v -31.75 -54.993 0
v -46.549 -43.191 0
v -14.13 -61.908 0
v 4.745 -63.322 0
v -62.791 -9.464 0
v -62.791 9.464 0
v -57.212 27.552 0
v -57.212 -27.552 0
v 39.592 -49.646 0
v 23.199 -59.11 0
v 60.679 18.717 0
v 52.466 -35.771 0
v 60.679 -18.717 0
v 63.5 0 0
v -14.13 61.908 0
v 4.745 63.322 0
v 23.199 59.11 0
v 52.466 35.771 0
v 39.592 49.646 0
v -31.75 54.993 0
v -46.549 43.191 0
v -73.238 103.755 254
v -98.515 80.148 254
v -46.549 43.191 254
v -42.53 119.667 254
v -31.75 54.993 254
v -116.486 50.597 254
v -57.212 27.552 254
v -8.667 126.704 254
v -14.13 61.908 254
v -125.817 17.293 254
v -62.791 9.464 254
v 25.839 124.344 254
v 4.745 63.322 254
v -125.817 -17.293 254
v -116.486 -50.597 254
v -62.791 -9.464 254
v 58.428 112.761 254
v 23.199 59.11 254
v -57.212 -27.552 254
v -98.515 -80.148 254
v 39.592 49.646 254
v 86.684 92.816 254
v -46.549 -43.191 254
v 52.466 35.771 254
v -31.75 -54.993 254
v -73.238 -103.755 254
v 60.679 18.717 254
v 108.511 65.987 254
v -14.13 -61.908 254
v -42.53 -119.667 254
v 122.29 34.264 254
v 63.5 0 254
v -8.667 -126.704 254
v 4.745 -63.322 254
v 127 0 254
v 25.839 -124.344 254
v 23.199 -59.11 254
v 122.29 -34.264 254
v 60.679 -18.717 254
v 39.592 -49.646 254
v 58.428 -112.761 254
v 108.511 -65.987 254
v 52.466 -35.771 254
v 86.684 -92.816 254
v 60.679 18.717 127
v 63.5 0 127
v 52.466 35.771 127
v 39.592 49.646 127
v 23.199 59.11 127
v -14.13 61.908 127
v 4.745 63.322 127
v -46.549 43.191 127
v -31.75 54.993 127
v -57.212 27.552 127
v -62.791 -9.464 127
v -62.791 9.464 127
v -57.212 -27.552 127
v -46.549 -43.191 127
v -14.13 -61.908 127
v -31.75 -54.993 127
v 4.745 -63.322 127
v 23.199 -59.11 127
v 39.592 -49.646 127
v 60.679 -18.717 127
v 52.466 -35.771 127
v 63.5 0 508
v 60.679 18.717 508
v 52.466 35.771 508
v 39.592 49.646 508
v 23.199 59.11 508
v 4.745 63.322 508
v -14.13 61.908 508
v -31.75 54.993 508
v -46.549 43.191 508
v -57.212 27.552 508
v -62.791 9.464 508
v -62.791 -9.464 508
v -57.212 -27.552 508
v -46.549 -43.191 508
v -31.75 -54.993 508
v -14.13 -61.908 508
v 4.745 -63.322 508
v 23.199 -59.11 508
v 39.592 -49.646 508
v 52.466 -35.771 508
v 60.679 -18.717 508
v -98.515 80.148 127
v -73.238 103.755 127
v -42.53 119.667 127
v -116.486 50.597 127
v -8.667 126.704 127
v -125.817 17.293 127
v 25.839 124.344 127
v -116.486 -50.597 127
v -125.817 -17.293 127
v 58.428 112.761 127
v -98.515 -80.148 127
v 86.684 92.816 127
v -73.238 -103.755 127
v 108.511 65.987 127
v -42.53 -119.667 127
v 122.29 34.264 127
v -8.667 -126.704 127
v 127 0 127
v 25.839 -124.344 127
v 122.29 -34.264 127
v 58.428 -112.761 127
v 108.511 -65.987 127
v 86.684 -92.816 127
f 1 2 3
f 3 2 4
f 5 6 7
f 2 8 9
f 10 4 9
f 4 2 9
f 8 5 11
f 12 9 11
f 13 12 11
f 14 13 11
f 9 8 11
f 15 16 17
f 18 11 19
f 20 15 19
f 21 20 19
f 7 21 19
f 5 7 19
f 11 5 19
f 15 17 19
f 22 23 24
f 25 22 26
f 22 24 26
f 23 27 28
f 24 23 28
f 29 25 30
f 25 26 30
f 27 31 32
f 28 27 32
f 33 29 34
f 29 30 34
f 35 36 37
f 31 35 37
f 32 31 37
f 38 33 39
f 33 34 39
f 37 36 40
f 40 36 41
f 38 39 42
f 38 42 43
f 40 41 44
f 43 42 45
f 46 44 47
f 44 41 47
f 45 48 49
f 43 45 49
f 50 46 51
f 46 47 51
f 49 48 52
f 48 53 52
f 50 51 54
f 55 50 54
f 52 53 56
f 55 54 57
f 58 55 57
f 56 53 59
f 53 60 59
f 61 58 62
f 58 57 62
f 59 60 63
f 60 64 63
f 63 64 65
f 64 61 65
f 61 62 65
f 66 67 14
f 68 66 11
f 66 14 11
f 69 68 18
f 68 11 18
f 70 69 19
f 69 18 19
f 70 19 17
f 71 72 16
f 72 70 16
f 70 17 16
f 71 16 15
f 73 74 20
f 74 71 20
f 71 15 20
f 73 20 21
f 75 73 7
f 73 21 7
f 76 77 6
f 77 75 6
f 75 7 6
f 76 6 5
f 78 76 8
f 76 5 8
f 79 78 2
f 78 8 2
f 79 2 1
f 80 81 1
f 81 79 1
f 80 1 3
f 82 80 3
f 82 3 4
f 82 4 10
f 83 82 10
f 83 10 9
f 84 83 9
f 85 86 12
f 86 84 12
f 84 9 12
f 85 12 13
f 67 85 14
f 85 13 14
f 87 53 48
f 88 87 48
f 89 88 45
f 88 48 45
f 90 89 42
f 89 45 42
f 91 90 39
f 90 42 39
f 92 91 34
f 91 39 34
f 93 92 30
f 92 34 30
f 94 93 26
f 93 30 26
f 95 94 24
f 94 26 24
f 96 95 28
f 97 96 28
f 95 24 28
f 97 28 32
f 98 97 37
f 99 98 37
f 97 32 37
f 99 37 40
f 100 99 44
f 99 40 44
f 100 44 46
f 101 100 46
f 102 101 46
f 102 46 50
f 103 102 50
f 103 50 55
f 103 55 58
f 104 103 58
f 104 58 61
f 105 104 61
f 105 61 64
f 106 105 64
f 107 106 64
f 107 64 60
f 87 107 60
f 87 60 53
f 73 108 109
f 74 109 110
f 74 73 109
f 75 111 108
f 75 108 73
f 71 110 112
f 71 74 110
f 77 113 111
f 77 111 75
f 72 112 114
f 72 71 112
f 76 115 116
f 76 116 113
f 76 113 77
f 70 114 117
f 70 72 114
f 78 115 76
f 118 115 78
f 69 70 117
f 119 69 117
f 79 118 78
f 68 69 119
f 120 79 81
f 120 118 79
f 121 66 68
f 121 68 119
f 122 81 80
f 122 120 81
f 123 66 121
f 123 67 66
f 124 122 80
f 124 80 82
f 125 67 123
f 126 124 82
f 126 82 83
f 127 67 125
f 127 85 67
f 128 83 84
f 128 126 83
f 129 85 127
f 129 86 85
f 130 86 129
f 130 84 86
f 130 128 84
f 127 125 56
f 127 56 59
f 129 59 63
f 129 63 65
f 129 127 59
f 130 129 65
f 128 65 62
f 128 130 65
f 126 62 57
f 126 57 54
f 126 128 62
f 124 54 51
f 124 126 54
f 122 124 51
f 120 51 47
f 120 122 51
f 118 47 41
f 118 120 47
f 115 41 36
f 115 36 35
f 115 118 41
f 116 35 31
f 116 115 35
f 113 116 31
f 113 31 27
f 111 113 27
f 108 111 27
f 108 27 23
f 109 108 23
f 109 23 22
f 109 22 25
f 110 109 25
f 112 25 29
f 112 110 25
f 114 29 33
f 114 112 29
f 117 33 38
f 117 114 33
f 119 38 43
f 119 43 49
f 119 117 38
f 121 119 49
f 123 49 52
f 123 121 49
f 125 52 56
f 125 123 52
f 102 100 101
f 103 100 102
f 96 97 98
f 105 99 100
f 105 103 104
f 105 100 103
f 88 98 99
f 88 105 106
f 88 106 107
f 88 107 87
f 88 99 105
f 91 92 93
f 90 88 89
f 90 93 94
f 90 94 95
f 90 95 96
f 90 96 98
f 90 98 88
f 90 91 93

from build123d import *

# Parameters (mm, degrees)
F0_R     = 63.5
F1_DEPTH = 508
F3_R     = 127
F4_DEPTH = 127


with BuildPart() as f1:
    # F0 (on Top) → F1 (new body)
    with BuildSketch(Plane.XY):
        Circle(F0_R)
    extrude(amount=F1_DEPTH)

    # F3 (on offset) → F4 (join)
    with BuildSketch(Plane(origin=(0, 0, 127), x_dir=(1, 0, 0), z_dir=(0, 0, -1))):
        Circle(F3_R)
    extrude(amount=-F4_DEPTH)


solid = f1.part
